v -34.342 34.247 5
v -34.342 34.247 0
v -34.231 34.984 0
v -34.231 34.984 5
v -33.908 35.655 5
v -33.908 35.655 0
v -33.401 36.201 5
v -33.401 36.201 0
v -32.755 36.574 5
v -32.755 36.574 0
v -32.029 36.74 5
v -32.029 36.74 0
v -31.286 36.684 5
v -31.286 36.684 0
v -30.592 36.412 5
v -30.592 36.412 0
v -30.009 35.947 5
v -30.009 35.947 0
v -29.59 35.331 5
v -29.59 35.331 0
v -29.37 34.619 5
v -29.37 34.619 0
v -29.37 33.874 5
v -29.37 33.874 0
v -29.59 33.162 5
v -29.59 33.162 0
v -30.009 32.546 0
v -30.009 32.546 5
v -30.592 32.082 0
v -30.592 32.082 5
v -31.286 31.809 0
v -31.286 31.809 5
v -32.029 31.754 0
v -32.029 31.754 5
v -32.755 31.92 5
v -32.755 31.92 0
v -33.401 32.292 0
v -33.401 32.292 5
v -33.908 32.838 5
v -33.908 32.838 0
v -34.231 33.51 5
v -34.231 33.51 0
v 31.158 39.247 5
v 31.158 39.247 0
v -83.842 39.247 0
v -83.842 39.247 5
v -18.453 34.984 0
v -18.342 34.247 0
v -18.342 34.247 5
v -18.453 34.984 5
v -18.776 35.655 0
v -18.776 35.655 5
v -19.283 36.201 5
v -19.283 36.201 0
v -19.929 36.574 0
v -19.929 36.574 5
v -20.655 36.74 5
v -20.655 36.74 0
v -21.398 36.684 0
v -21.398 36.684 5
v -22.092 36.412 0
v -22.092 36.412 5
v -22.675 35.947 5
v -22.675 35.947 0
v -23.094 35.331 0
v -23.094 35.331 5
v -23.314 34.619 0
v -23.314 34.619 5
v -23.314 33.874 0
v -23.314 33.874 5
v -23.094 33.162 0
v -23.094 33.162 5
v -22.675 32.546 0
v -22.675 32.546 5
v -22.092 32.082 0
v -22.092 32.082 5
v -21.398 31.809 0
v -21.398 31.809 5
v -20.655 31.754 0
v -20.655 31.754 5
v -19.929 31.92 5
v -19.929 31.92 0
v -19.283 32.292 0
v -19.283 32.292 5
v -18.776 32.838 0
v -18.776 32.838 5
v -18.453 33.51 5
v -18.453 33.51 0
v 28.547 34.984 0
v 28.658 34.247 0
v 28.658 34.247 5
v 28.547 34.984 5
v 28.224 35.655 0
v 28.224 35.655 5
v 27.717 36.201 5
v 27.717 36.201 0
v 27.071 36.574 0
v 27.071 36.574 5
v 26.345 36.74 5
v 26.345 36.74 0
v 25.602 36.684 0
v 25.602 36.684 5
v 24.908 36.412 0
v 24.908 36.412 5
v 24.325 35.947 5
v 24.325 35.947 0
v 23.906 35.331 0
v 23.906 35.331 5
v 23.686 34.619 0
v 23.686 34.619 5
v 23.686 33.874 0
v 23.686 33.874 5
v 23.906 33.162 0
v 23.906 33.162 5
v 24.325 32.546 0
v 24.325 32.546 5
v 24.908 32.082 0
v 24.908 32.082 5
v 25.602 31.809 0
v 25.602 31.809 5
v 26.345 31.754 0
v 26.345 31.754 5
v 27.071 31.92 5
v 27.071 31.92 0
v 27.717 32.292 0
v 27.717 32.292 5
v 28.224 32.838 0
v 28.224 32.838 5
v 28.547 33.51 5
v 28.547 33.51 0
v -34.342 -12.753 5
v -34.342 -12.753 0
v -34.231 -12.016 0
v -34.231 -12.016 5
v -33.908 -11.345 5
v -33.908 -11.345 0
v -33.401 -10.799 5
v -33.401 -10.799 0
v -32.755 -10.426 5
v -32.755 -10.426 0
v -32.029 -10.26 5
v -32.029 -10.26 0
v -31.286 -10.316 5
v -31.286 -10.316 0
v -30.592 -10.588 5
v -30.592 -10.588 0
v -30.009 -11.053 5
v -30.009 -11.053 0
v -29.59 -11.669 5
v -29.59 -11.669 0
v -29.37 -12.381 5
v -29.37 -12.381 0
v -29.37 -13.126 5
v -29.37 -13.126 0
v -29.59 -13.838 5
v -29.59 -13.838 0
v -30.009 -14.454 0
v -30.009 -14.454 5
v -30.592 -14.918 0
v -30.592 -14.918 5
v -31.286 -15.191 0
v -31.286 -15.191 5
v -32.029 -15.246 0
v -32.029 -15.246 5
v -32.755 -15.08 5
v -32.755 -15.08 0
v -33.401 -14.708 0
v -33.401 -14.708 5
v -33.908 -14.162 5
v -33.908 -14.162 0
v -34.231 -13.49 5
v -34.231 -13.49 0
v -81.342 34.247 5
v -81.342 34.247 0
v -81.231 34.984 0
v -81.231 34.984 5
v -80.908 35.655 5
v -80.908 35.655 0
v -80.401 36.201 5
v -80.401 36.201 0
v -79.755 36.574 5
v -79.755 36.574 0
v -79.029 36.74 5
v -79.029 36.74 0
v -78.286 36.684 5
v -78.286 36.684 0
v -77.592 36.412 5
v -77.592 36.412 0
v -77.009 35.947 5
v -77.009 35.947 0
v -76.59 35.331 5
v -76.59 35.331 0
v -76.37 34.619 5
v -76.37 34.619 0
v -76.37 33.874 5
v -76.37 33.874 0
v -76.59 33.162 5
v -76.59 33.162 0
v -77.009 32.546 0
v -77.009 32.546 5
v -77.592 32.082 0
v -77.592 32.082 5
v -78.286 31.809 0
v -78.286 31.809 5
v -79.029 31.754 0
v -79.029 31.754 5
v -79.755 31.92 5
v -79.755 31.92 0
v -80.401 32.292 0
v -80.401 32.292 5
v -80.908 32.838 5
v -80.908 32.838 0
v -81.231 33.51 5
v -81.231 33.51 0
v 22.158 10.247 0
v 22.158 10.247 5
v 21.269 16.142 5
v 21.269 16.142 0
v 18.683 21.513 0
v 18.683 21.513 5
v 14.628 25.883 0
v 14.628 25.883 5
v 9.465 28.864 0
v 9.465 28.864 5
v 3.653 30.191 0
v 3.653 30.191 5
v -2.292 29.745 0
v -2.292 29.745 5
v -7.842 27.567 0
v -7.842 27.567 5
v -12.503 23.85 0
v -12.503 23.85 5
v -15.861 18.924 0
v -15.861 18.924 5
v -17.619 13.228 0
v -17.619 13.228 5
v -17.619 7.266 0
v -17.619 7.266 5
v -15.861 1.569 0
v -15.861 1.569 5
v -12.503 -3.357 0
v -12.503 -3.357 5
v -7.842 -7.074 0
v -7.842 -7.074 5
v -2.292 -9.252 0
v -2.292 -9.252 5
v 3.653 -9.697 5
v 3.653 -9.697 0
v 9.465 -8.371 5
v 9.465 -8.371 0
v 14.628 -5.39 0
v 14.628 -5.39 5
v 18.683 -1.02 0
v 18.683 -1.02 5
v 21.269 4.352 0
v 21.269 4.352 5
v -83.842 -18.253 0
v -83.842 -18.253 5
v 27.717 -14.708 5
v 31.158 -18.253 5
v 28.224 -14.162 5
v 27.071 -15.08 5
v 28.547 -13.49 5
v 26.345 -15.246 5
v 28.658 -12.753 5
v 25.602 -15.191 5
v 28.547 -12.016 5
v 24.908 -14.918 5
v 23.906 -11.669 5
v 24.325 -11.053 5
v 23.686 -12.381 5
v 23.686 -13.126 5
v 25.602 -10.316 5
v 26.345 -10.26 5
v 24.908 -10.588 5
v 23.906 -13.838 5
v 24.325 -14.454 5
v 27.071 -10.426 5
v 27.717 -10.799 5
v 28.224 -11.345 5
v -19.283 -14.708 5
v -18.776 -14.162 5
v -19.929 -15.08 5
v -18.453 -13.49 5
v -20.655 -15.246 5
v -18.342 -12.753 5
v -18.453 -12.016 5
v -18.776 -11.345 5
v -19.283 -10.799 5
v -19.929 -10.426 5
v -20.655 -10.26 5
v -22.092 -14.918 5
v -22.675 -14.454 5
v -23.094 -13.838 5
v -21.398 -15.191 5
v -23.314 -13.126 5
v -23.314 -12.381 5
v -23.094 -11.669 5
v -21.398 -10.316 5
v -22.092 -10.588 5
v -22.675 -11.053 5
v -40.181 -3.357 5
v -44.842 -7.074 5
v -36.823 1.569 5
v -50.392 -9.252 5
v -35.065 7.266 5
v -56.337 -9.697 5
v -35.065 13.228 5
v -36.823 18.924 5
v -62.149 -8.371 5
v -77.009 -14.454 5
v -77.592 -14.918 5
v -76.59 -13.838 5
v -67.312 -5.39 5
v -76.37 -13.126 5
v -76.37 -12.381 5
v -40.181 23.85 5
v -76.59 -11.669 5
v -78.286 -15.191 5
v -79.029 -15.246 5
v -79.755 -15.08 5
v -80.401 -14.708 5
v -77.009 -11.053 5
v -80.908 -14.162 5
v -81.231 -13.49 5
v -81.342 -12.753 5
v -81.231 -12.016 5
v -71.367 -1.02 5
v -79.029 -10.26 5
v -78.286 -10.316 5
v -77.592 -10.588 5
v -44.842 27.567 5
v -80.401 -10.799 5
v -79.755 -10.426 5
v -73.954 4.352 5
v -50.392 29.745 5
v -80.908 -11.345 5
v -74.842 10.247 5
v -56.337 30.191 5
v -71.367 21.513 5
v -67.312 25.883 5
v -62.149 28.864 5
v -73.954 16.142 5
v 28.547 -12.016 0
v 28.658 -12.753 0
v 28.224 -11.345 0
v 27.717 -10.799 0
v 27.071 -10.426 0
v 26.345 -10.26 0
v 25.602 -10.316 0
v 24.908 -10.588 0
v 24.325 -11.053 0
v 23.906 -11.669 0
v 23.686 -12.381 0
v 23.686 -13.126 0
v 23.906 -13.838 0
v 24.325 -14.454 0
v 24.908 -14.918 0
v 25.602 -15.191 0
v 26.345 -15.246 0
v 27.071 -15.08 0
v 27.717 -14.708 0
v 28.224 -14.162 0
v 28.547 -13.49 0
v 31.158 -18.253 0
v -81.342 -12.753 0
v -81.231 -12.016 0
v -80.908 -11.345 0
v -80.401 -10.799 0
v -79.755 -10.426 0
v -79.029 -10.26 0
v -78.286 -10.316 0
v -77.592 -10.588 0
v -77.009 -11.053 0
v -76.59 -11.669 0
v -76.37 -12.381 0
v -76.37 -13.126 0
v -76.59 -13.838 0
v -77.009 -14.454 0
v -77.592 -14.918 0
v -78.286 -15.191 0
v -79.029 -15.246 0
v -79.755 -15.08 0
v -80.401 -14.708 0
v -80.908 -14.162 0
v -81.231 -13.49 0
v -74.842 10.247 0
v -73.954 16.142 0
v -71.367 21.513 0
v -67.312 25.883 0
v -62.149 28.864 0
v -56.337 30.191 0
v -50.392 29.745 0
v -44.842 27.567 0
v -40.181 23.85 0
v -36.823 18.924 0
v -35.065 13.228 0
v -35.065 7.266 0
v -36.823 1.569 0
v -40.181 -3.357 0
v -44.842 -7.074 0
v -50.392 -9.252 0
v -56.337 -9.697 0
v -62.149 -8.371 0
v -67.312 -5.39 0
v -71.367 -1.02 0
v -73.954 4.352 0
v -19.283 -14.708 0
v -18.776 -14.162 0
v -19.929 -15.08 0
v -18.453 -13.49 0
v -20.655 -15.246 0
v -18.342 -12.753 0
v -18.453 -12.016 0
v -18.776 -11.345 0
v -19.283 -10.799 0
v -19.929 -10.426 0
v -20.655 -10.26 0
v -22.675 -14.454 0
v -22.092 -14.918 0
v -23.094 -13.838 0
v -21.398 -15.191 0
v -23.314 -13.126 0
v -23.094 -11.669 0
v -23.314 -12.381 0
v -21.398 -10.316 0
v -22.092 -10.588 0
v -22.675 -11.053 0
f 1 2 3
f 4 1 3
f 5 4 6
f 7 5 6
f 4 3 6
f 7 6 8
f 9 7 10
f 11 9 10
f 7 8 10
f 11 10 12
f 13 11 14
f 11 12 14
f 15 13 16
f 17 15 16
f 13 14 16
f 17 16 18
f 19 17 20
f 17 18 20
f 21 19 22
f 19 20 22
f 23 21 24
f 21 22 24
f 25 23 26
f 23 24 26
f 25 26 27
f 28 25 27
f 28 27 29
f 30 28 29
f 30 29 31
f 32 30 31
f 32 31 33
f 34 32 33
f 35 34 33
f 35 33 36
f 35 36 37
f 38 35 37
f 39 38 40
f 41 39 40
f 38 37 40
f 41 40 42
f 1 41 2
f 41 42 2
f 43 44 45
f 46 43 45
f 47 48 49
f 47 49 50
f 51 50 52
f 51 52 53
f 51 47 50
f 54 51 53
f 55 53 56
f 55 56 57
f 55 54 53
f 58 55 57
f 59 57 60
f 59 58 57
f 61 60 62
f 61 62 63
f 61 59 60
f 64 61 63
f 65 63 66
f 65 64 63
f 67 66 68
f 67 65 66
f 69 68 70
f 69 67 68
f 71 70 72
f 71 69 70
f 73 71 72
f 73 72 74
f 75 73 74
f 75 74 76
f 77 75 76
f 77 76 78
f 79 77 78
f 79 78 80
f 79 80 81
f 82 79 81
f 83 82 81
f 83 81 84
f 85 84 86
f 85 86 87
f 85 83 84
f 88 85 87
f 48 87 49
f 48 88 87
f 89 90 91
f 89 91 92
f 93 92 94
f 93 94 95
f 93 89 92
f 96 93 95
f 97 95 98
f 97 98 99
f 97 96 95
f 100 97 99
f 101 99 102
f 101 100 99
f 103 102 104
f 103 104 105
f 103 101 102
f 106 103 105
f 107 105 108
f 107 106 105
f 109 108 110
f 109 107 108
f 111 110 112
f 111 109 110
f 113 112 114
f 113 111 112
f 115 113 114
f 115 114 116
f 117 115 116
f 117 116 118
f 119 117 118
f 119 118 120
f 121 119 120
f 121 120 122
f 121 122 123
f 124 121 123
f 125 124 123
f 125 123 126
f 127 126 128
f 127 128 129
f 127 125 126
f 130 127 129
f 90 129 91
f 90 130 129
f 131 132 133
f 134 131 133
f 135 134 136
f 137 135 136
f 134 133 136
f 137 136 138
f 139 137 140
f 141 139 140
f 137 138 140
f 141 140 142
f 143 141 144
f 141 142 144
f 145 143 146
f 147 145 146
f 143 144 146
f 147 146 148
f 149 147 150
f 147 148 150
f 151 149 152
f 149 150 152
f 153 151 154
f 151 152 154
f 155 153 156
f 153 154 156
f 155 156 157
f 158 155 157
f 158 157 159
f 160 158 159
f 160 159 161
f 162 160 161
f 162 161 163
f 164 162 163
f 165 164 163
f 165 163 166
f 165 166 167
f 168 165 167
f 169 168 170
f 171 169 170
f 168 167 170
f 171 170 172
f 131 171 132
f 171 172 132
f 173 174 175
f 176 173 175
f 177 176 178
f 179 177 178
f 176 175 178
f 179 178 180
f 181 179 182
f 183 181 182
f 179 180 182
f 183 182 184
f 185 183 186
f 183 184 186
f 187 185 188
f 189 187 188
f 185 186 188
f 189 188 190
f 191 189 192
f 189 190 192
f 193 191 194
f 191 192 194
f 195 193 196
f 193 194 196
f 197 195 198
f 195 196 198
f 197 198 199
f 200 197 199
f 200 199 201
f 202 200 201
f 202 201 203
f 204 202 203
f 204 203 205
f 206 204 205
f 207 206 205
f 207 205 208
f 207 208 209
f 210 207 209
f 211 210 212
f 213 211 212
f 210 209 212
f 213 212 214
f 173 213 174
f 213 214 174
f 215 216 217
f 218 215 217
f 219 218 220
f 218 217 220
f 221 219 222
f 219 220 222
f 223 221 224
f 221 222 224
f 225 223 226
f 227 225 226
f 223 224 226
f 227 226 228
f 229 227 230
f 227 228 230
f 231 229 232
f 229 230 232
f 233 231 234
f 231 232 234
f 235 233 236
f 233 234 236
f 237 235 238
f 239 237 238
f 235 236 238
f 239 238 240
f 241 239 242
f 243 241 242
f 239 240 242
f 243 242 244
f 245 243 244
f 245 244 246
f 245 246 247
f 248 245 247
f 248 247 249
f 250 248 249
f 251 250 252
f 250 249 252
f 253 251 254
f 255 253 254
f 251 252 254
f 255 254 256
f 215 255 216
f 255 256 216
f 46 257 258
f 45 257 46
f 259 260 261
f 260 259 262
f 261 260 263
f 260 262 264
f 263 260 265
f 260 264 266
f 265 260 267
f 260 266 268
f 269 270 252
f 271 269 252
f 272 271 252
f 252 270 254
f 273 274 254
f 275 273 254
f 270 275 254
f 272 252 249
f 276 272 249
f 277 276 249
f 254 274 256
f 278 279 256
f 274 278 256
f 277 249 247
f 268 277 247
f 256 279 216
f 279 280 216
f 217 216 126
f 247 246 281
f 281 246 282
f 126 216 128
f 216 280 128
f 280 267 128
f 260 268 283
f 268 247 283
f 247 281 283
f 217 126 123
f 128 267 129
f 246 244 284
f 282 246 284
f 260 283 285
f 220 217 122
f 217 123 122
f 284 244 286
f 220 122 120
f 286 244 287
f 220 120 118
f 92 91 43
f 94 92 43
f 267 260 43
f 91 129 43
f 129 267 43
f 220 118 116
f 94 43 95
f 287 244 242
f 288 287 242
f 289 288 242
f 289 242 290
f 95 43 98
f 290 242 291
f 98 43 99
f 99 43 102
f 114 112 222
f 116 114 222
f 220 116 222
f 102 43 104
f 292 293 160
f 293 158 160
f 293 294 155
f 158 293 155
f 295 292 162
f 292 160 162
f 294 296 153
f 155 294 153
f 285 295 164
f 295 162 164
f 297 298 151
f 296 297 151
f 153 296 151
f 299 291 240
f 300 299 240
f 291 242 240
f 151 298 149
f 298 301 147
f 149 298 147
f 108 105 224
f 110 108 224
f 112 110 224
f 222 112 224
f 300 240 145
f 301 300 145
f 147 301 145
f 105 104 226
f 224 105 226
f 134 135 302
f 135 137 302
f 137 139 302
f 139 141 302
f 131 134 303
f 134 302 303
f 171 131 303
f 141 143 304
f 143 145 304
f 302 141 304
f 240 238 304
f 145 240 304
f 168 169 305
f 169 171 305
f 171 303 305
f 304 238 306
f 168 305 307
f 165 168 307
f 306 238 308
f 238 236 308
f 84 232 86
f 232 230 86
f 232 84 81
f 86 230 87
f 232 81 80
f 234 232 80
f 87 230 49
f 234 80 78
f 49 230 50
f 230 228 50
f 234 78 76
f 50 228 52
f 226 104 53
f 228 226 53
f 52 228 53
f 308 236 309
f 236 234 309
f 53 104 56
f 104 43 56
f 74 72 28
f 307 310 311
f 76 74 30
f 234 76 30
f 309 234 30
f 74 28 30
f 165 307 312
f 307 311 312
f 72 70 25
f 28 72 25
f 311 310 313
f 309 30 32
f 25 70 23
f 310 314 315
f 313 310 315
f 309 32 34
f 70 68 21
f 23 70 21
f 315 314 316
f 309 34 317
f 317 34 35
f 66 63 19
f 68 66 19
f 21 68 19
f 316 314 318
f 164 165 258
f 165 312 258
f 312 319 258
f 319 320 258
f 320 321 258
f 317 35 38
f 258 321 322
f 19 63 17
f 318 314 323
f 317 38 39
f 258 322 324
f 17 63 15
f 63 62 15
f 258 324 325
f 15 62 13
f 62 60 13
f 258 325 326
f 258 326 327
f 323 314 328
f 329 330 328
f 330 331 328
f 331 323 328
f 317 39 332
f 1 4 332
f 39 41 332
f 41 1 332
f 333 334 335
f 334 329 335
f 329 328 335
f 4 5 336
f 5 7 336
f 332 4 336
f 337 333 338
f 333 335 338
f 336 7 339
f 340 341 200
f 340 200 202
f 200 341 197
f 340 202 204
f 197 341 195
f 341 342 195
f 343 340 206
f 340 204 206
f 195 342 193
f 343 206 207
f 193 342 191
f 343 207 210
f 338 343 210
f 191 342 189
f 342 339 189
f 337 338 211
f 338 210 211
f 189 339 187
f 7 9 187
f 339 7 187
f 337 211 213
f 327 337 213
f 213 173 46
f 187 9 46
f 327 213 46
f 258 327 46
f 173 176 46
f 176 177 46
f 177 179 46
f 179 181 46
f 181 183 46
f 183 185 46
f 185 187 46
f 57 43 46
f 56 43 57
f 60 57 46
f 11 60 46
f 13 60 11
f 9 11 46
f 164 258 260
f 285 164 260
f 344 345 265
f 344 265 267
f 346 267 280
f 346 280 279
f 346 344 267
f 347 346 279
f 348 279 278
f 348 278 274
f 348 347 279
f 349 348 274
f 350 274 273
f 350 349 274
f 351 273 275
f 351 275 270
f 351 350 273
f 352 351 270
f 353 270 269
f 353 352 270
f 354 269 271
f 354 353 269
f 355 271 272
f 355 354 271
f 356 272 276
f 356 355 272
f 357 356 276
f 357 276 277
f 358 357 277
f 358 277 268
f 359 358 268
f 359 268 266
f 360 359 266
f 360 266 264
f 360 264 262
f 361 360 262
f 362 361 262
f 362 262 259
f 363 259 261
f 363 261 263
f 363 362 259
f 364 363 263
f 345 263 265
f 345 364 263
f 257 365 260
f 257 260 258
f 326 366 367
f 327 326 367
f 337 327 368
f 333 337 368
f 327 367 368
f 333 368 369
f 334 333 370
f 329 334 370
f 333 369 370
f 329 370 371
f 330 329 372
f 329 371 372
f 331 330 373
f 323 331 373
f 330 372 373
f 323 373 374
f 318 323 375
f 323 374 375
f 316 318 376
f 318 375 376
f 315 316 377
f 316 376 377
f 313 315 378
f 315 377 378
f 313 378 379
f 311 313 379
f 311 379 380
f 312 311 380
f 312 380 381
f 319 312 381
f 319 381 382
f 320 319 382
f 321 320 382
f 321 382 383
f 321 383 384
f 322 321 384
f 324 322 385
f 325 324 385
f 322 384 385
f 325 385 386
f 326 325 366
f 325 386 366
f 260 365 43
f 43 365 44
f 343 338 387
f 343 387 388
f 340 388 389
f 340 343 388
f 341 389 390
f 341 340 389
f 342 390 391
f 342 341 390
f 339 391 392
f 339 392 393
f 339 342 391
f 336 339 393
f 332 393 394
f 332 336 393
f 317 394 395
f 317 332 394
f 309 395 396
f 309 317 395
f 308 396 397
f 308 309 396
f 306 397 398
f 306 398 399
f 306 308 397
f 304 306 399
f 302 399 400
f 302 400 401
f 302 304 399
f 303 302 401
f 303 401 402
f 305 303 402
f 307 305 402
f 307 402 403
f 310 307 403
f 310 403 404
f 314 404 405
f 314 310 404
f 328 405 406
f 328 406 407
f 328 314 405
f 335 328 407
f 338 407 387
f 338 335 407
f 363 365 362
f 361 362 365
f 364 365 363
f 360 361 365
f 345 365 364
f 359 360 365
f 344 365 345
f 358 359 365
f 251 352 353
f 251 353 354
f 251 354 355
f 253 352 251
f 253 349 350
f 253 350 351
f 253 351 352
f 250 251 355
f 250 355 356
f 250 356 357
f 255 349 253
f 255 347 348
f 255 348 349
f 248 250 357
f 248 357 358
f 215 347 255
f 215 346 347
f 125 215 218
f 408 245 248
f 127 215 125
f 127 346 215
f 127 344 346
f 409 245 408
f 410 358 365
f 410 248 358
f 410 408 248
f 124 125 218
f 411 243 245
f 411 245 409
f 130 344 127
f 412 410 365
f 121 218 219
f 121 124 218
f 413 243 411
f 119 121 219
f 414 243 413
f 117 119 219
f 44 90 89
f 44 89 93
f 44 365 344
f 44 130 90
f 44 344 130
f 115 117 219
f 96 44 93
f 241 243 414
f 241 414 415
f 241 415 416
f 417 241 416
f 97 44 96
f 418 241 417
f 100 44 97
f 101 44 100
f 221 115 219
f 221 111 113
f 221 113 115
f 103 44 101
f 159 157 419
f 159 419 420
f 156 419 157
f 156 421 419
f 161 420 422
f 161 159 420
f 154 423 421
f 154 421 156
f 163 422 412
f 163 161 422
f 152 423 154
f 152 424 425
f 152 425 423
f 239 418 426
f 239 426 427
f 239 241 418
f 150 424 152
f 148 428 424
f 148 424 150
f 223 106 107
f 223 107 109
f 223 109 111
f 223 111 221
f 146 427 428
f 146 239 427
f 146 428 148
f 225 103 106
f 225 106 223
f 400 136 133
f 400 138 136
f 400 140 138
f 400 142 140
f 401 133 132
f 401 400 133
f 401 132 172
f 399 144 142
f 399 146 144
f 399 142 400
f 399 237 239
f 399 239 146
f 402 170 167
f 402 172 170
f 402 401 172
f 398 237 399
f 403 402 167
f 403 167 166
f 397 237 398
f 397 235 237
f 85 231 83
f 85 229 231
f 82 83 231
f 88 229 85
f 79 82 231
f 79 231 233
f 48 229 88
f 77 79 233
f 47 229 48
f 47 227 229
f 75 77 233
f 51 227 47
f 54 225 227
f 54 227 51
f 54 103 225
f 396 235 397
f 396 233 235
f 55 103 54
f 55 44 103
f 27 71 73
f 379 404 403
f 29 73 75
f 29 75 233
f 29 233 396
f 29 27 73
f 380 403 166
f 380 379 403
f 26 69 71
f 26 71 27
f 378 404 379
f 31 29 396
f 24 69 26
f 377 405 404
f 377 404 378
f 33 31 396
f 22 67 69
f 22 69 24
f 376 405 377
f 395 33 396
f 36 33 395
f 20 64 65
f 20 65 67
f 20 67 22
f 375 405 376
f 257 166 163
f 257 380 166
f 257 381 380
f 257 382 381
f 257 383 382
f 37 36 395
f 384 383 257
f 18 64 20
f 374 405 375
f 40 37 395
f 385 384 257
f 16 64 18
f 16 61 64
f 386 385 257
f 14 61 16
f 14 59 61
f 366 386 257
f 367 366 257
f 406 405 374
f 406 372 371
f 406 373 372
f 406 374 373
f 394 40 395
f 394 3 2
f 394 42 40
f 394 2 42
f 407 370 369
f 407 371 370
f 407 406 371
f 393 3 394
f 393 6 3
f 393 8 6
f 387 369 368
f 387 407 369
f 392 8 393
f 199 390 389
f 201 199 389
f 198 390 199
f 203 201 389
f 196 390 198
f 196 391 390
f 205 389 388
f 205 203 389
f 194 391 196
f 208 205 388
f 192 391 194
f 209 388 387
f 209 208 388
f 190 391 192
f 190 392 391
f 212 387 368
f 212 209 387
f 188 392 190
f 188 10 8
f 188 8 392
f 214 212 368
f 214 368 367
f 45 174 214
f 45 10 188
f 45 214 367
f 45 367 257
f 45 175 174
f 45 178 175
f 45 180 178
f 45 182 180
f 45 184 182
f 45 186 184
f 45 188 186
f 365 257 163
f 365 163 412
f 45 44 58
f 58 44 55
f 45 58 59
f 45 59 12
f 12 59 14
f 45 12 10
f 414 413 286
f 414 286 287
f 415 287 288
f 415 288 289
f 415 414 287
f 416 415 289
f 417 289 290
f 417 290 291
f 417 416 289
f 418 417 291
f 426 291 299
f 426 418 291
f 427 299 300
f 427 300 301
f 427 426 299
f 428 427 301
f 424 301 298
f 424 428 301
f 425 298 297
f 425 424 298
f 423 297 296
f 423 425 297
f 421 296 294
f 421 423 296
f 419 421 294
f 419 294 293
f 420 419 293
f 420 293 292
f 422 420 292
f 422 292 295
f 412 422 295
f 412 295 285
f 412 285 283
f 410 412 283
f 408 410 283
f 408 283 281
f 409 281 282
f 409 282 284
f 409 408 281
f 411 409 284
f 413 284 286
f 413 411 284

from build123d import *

# Parameters (mm, degrees)
F0_W     = 57.5
F0_H     = 57.5
F0_R     = 2.5
F1_DEPTH = 5
F2_R     = 20
F3_DEPTH = 5


with BuildPart() as f1:
    # F0 (on Top) → F1 (new body)
    with BuildSketch(Plane.XY):
        with Locations((2.407941, 10.496731)):
            Rectangle(F0_W, F0_H)
        with Locations((-20.842059, -12.753269)):
            Circle(F0_R, mode=Mode.SUBTRACT)
        with Locations((26.157941, -12.753269)):
            Circle(F0_R, mode=Mode.SUBTRACT)
        with Locations((-20.842059, 34.246731)):
            Circle(F0_R, mode=Mode.SUBTRACT)
        with Locations((26.157941, 34.246731)):
            Circle(F0_R, mode=Mode.SUBTRACT)
    extrude(amount=F1_DEPTH)

    # F2 (on face) → F3 (cut)
    with BuildSketch(Plane.XY.offset(5)):
        with Locations((2.157941, 10.246731)):
            Circle(F2_R)
    extrude(amount=-F3_DEPTH, mode=Mode.SUBTRACT)

    # F4: F1 across face


with BuildPart() as f1_1:
    add(f1.part)
    add(f1.part.mirror(Plane(origin=(-26.342059, 10.496731, 2.5), x_dir=(0, -1, 0), z_dir=(-1, 0, 0))))


solid = f1_1.part
